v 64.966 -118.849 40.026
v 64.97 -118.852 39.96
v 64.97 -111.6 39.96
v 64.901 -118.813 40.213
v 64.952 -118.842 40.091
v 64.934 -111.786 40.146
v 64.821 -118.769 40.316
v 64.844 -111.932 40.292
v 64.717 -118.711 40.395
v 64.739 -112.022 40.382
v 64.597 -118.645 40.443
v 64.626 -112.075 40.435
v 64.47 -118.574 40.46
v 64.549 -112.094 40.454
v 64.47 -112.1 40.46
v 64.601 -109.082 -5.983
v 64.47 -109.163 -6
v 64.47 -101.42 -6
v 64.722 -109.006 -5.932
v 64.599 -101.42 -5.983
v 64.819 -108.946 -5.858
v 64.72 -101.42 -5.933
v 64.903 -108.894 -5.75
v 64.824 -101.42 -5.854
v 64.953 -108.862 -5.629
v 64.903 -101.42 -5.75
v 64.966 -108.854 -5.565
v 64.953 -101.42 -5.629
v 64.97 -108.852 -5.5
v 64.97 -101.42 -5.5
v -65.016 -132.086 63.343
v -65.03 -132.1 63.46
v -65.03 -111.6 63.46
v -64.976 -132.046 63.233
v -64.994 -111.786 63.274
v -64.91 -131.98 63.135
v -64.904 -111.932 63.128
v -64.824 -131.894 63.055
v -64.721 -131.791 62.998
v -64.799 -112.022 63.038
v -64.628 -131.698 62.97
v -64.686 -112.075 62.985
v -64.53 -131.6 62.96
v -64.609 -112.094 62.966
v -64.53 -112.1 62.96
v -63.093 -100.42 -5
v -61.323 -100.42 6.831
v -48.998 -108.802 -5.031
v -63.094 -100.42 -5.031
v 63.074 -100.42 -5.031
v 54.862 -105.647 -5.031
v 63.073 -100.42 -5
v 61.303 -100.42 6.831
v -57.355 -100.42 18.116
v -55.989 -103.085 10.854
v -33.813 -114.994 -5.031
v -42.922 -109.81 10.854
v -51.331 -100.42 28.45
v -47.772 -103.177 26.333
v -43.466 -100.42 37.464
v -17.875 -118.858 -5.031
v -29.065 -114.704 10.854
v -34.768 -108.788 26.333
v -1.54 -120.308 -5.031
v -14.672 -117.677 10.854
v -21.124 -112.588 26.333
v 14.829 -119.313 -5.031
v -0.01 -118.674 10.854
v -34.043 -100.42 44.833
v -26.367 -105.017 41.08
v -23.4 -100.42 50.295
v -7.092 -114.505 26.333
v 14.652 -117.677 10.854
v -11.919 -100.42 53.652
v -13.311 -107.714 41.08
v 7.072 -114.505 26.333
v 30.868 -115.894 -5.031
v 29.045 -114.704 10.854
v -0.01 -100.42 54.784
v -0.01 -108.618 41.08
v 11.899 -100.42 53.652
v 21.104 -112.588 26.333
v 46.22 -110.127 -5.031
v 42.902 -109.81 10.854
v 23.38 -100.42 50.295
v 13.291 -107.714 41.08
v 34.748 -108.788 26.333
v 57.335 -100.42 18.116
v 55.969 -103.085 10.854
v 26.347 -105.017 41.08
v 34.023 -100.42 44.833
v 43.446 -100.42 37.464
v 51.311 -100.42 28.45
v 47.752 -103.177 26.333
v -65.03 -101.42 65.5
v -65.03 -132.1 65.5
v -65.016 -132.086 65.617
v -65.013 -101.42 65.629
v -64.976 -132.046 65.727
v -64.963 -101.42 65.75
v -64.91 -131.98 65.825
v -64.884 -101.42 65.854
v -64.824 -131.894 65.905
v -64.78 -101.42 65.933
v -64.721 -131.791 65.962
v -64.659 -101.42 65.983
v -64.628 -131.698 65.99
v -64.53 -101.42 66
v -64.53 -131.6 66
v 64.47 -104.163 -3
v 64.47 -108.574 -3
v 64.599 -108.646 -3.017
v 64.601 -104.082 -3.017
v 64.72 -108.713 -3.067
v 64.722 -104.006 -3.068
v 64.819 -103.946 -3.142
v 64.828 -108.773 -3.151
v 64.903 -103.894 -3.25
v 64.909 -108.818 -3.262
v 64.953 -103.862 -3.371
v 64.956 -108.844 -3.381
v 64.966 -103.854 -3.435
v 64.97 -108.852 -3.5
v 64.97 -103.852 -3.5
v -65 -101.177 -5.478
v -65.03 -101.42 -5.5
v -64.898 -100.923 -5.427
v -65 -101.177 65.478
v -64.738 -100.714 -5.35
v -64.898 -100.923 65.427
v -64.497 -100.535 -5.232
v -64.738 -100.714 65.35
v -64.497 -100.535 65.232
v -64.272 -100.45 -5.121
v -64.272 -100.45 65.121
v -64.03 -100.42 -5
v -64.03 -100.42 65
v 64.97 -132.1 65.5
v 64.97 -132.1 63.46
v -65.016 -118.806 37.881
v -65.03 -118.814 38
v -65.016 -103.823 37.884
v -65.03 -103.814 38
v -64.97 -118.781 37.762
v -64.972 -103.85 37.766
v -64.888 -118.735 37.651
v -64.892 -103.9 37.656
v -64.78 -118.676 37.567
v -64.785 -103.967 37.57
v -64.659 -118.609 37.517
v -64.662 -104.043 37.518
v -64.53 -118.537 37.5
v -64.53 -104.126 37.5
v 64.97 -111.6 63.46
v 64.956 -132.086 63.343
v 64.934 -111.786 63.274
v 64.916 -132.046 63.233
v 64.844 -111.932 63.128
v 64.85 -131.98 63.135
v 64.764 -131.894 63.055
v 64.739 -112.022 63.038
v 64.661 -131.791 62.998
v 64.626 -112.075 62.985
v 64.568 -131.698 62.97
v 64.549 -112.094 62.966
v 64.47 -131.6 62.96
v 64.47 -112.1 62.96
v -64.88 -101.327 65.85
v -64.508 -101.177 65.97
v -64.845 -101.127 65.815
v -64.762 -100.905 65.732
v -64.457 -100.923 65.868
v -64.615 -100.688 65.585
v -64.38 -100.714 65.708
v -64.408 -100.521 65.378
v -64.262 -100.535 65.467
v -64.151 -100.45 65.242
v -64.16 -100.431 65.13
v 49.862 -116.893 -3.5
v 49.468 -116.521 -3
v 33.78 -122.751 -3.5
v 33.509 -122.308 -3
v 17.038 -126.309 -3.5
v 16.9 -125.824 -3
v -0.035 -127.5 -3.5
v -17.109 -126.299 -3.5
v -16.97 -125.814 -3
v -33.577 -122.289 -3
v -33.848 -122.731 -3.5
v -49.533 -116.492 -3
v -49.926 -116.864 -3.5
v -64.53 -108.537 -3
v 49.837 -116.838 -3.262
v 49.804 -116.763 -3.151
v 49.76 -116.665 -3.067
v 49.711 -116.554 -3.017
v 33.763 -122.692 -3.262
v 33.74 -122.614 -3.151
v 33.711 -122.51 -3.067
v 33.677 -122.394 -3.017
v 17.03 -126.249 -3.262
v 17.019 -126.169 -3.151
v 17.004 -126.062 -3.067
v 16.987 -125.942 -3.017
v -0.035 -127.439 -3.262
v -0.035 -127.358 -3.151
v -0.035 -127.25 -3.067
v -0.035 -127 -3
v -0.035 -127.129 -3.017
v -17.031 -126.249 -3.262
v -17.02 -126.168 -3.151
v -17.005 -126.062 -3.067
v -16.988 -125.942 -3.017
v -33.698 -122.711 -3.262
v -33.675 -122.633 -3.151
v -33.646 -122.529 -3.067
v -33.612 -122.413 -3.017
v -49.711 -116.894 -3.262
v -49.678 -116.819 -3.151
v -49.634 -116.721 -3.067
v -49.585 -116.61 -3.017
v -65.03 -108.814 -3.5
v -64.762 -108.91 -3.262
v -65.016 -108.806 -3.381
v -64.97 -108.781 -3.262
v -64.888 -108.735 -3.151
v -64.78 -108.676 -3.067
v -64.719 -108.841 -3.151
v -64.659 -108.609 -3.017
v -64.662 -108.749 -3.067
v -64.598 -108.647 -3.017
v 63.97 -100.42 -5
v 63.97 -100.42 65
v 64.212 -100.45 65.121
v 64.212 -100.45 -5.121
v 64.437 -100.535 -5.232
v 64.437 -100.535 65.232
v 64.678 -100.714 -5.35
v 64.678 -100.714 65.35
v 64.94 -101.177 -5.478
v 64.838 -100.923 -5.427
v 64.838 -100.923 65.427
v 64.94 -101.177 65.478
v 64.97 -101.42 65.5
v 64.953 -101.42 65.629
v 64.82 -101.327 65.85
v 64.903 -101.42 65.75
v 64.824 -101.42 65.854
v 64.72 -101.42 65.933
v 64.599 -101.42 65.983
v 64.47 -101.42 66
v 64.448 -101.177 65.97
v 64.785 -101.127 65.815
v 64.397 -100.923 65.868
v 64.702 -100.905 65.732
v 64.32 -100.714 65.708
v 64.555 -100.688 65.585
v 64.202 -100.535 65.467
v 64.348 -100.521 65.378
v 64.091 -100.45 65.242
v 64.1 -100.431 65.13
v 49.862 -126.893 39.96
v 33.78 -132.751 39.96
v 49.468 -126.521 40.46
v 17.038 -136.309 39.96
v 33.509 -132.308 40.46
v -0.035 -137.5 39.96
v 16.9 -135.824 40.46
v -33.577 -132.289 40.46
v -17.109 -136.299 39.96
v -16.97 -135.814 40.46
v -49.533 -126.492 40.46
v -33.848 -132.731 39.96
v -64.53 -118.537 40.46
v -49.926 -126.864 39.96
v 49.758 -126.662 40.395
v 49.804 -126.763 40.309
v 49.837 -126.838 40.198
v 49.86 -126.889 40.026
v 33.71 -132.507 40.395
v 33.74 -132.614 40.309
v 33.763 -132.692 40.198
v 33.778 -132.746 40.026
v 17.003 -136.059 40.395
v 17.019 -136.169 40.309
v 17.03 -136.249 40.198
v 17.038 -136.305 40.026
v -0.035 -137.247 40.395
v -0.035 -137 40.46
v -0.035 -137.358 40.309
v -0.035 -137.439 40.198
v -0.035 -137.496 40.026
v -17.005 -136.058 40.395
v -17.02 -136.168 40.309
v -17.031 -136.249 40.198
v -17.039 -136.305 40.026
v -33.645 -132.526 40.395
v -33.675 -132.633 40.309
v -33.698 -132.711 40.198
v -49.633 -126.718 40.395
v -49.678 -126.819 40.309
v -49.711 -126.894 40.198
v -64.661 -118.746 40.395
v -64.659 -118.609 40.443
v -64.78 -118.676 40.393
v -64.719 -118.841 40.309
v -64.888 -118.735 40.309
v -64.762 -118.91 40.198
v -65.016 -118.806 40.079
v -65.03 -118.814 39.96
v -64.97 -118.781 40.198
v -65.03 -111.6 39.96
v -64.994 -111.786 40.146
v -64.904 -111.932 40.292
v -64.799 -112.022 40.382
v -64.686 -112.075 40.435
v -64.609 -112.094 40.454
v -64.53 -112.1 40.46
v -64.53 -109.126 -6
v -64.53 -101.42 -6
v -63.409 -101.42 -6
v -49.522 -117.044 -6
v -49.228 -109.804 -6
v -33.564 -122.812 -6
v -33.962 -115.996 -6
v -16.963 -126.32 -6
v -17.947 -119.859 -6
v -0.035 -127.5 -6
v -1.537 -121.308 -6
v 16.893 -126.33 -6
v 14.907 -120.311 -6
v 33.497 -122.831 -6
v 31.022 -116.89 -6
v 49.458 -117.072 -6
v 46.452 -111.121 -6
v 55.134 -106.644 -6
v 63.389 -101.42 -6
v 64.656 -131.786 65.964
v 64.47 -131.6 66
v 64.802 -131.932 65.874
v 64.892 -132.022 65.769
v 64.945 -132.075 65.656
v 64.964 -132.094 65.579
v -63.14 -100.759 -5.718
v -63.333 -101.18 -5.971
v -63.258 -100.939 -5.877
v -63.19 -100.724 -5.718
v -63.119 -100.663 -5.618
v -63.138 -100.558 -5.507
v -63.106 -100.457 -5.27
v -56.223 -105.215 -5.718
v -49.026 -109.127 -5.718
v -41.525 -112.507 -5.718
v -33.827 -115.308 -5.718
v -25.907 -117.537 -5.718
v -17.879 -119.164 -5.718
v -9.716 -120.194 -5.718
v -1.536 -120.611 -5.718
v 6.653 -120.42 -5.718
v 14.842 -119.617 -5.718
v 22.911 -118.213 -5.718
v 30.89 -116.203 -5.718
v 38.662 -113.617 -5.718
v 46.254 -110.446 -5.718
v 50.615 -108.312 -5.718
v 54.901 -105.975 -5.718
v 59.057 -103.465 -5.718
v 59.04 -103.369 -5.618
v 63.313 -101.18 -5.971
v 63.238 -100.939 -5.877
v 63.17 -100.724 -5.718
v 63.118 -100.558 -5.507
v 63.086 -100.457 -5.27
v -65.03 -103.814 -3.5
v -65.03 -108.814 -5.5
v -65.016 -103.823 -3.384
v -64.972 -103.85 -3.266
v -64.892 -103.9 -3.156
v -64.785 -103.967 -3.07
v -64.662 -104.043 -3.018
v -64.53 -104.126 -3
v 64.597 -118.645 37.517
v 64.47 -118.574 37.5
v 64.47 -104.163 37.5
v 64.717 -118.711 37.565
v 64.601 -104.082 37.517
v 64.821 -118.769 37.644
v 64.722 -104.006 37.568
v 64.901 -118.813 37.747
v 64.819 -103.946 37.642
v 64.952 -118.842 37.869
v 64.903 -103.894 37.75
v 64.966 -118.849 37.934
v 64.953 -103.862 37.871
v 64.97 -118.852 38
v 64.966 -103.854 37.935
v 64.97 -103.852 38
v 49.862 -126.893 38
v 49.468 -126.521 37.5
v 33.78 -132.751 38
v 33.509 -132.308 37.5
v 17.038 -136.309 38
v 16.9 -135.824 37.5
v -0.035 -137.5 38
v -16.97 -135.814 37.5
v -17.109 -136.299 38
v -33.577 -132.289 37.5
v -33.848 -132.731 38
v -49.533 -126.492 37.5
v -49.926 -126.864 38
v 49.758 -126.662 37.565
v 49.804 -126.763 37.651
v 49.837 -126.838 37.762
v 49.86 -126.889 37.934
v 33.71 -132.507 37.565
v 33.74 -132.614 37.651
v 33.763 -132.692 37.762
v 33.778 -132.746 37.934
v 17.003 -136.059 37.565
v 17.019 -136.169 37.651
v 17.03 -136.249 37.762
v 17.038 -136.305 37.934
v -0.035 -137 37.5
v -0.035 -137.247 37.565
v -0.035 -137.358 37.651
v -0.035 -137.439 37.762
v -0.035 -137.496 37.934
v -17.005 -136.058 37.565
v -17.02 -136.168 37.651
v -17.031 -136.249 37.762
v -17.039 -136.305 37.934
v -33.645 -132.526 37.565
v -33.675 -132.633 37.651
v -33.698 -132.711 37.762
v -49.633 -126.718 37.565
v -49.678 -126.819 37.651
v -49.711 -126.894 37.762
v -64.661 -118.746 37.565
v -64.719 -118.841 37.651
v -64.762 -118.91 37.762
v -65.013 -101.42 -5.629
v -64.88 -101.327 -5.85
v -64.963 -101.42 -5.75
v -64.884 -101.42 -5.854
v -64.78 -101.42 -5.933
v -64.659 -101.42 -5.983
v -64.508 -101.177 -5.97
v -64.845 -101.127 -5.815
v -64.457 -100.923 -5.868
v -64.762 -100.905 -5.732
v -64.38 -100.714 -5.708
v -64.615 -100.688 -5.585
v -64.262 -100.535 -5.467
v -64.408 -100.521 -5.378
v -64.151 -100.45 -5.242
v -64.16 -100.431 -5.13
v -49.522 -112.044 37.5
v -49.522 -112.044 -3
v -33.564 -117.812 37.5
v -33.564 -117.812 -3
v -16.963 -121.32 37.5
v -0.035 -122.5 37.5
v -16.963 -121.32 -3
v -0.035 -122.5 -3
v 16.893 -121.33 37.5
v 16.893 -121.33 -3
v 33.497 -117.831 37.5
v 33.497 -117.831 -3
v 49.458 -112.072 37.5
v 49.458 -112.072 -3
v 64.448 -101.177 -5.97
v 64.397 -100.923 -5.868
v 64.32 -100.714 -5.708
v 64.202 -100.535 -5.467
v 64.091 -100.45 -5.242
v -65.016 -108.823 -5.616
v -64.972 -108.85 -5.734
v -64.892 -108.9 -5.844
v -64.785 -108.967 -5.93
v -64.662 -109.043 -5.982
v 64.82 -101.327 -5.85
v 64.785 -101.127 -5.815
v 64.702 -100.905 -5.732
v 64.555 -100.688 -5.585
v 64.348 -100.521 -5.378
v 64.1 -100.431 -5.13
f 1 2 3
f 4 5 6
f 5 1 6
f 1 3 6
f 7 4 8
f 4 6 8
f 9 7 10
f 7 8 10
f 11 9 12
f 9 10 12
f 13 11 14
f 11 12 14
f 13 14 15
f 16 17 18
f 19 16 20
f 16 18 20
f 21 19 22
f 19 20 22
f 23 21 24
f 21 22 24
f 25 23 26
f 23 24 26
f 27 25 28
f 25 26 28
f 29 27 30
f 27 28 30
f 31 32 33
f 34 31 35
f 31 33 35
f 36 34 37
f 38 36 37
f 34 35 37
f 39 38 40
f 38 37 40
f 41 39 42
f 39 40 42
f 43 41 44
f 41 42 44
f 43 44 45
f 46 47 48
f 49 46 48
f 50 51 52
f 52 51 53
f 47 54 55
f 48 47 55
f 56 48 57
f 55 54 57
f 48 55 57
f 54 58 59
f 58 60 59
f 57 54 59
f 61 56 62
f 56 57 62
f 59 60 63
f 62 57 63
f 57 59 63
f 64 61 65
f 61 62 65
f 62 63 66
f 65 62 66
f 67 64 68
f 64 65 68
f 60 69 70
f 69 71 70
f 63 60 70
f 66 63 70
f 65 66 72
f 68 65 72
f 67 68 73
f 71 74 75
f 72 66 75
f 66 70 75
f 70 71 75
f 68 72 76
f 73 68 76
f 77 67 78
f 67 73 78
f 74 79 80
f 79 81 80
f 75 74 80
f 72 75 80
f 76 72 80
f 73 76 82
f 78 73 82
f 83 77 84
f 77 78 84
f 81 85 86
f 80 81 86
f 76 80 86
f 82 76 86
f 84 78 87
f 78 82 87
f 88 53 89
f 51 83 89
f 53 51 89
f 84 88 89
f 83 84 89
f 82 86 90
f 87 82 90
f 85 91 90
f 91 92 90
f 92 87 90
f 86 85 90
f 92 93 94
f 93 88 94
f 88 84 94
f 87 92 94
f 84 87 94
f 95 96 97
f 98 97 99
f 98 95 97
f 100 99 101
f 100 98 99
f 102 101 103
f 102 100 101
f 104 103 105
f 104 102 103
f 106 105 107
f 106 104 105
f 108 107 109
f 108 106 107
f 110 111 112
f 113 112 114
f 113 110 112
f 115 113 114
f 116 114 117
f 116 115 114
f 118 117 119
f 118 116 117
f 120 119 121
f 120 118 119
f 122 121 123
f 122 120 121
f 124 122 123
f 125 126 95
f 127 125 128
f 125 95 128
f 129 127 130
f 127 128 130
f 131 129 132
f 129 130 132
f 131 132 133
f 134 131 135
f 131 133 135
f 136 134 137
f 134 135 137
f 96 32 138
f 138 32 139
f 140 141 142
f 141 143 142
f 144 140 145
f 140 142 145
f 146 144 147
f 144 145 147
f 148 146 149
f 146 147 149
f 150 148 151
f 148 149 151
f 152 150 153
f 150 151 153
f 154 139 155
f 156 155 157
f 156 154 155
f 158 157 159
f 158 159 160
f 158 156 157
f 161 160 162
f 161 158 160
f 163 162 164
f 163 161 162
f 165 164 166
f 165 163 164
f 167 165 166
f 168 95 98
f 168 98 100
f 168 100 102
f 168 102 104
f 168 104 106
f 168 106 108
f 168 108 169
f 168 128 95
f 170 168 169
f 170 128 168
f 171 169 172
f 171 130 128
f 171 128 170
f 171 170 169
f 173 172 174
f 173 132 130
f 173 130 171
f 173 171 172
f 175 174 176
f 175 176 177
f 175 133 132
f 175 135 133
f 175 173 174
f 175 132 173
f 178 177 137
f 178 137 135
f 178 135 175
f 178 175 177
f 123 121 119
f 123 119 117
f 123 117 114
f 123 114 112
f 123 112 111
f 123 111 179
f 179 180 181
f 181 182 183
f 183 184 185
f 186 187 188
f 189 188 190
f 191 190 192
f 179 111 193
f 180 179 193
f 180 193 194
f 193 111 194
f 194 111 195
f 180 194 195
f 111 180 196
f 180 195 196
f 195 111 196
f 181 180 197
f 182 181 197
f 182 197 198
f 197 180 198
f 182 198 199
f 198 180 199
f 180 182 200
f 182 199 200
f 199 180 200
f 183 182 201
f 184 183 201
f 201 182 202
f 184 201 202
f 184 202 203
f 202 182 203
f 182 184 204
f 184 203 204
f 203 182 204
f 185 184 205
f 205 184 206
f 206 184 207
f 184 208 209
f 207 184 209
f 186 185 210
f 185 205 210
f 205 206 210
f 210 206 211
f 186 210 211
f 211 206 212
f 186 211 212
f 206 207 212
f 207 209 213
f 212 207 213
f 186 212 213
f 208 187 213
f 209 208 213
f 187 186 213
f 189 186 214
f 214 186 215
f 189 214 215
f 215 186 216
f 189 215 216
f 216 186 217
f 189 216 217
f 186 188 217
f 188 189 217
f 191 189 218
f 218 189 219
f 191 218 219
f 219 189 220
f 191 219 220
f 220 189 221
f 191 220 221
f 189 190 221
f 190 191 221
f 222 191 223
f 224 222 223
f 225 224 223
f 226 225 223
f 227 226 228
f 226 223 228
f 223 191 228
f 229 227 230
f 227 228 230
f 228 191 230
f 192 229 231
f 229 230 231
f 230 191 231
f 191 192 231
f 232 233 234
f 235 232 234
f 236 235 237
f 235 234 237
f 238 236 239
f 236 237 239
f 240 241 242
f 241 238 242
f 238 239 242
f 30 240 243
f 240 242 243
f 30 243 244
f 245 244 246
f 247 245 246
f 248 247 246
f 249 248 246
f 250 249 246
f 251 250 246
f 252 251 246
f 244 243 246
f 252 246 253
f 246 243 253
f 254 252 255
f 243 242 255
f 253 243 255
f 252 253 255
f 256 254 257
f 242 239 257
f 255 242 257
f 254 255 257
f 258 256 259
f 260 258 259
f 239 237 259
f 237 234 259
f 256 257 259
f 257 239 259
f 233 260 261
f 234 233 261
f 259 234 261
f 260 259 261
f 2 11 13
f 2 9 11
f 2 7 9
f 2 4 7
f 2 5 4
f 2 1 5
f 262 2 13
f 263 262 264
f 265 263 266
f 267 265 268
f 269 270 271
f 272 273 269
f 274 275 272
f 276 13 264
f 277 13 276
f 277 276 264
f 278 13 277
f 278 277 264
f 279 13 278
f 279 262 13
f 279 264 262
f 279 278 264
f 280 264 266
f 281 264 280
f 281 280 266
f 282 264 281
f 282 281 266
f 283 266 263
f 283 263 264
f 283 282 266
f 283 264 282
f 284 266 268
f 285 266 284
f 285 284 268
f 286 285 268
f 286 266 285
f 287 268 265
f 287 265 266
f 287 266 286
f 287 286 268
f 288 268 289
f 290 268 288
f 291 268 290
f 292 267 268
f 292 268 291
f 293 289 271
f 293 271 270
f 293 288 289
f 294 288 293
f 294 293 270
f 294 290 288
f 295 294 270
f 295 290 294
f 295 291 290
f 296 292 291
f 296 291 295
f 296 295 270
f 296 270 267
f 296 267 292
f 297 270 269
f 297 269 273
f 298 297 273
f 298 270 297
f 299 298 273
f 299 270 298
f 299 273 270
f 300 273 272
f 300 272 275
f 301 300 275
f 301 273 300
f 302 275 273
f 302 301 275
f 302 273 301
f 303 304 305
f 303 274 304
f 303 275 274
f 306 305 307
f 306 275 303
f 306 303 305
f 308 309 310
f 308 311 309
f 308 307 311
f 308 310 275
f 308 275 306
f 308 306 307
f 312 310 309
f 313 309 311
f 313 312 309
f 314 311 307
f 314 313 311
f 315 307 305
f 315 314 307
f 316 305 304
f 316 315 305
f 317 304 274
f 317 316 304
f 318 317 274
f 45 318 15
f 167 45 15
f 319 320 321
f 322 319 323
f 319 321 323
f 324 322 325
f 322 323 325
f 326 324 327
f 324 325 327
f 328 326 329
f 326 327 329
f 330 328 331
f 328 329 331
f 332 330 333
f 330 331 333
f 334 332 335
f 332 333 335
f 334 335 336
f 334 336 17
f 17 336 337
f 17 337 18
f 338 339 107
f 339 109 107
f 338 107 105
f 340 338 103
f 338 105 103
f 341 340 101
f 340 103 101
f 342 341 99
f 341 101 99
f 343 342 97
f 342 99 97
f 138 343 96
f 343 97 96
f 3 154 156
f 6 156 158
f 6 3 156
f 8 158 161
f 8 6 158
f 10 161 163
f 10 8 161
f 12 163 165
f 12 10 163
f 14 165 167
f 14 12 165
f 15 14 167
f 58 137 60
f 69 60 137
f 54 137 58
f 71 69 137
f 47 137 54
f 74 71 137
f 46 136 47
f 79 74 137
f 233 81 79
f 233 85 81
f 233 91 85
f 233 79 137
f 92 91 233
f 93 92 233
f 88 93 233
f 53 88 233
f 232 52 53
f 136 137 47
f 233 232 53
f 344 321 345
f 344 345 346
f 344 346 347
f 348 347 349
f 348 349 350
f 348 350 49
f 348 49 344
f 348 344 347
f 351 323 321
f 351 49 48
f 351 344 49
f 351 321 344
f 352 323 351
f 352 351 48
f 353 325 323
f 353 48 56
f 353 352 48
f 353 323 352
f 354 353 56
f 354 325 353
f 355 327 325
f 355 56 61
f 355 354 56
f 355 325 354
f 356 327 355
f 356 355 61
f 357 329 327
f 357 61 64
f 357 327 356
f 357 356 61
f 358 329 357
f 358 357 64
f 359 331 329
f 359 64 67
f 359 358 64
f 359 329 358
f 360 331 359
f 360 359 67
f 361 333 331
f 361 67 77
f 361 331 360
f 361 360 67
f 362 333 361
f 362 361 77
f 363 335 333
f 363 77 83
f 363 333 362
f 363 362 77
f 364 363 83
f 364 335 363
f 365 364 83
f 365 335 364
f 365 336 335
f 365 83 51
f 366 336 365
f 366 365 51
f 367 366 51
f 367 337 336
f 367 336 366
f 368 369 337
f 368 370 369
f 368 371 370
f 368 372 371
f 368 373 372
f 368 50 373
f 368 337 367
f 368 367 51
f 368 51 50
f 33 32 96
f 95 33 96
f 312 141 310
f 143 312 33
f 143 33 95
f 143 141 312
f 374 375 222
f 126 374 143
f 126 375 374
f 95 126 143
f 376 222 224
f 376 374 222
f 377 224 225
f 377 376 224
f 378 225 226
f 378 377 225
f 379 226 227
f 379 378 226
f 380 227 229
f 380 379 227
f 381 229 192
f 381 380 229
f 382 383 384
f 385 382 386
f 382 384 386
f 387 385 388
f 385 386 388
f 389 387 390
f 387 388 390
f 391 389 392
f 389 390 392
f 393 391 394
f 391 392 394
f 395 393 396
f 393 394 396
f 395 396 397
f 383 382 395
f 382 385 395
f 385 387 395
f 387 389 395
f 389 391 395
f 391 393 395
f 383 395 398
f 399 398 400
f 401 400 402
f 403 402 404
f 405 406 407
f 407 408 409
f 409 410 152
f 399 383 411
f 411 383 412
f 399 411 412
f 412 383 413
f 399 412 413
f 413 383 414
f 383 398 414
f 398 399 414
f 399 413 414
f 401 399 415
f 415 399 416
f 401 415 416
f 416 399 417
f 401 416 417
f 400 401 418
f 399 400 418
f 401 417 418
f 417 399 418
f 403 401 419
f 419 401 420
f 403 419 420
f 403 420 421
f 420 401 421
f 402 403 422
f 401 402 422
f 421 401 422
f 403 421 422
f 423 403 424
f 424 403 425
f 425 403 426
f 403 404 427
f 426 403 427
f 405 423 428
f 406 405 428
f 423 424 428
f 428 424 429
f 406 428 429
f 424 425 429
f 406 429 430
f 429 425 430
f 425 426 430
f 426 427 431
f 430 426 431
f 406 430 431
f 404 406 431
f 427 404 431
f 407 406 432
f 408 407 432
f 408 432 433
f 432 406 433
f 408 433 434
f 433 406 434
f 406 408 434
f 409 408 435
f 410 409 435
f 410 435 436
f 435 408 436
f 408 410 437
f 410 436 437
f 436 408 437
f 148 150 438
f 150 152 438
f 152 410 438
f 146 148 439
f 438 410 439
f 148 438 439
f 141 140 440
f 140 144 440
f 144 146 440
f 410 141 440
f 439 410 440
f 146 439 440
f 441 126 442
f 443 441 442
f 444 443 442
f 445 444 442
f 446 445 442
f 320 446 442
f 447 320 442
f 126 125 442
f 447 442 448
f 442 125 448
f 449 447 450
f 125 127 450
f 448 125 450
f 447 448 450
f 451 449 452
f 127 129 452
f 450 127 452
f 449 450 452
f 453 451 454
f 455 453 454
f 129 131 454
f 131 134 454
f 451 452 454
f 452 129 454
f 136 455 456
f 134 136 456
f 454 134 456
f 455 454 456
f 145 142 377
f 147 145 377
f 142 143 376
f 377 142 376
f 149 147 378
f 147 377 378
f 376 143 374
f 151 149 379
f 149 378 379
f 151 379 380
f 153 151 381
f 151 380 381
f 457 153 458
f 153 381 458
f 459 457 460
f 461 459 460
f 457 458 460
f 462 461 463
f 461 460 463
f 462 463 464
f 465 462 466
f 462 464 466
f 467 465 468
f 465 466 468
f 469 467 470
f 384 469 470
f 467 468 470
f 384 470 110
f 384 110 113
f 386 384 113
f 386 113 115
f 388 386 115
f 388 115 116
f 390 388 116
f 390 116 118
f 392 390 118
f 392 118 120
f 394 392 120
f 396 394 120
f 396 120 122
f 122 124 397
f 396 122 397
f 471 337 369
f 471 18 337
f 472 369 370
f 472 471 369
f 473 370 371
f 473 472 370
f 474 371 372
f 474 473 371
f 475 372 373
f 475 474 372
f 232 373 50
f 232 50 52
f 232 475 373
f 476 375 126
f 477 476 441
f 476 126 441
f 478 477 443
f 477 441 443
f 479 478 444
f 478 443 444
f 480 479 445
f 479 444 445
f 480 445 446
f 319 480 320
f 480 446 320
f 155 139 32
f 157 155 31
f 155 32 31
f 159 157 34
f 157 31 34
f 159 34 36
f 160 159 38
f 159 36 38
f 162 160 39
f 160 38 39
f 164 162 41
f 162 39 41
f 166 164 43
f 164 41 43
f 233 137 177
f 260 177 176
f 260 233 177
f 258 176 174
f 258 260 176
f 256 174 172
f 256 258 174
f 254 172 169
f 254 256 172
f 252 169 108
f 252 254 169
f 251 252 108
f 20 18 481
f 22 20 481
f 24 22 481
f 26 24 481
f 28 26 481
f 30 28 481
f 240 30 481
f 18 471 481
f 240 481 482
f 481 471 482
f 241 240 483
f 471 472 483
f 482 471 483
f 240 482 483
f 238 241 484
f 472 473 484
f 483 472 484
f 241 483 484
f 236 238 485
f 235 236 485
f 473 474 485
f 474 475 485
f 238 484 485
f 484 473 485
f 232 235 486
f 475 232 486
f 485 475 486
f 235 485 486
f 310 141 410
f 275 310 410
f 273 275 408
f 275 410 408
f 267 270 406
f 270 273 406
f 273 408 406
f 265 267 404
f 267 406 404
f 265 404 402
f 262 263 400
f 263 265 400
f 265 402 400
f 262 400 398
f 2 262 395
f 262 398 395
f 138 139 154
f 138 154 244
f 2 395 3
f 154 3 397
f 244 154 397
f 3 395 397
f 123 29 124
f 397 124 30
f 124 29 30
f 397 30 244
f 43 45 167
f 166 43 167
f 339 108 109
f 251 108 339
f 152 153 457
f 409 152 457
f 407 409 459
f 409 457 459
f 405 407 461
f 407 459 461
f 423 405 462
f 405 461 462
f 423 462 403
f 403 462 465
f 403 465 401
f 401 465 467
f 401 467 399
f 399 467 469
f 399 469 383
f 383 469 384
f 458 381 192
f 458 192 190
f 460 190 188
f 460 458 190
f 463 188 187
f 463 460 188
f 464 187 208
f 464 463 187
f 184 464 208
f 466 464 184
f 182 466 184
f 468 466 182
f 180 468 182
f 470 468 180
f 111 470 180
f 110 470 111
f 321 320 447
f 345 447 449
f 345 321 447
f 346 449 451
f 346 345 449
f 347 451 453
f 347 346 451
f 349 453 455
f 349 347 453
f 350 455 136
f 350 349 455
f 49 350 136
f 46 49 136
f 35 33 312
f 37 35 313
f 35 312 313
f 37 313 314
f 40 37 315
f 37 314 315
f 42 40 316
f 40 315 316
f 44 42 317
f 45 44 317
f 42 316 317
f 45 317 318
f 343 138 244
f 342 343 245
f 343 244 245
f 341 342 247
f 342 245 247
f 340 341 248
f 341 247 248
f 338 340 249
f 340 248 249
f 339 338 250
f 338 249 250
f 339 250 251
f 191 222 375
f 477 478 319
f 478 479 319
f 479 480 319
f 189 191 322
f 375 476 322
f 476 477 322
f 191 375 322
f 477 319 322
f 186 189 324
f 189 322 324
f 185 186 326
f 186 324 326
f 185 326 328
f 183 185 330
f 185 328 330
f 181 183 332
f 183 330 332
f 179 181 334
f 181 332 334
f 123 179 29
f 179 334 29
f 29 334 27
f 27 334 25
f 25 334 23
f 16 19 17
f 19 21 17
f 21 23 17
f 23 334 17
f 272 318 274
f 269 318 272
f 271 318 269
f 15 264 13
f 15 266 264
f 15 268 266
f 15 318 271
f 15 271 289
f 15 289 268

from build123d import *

# Parameters (mm, degrees)
BOX003_W      = 570
BOX003_H      = 100
BOX003_DEPTH  = 22.5
TUBE003_R     = 250
TUBE003_R_2   = 122.5
TUBE003_DEPTH = 37.5
TUBE002_R     = 250
TUBE002_R_2   = 122.5
TUBE002_DEPTH = 37.5
TUBE001_R     = 250
TUBE001_R_2   = 122.5
TUBE001_DEPTH = 40.5
BOX001_W      = 570
BOX001_H      = 100
BOX001_DEPTH  = 22.5
BOX_W         = 130
BOX_H         = 70
BOX_DEPTH     = 72
FILLET_R      = 1
FILLET001_R   = 0.5
FILLET002_R   = 0.5
FILLET003_R   = 0.5


with BuildPart() as sphere:
    # Sphere → Sphere (revolve)
    with BuildSketch(Plane(origin=(-0.01, -10.37, -8.39), x_dir=(1, 0, 0), z_dir=(0, -1, 0))):
        with BuildLine():
            ThreePointArc((0, -110), (110, 0), (0, 110))
            Line((0, 110), (0, -110))
        make_face()
    revolve(axis=Axis((-0.01, -10.37, -8.39), (0, 0, 1)))


with BuildPart() as box003:
    # Box003 → Box003 (new body)
    with BuildSketch(Plane(origin=(-285.31, -232.1, 44.4), x_dir=(1, 0, 0), z_dir=(0, 0, 1))):
        with Locations((285, 50)):
            Rectangle(BOX003_W, BOX003_H)
    extrude(amount=BOX003_DEPTH)


with BuildPart() as tube003:
    # Tube003 → Tube003 (new body)
    with BuildSketch(Plane(origin=(0, -15, 10), x_dir=(1, 0, 0), z_dir=(0, 0, 1))):
        Circle(TUBE003_R)
        Circle(TUBE003_R_2, mode=Mode.SUBTRACT)
    extrude(amount=TUBE003_DEPTH)


with BuildPart() as tube002:
    # Tube002 → Tube002 (new body)
    with BuildSketch(Plane(origin=(0, -5, -10), x_dir=(1, 0, 0), z_dir=(0, 0, 1))):
        Circle(TUBE002_R)
        Circle(TUBE002_R_2, mode=Mode.SUBTRACT)
    extrude(amount=TUBE002_DEPTH)


with BuildPart() as tube001:
    # Tube001 → Tube001 (new body)
    with BuildSketch(Plane.XY.offset(-3)):
        Circle(TUBE001_R)
        Circle(TUBE001_R_2, mode=Mode.SUBTRACT)
    extrude(amount=TUBE001_DEPTH)


with BuildPart() as box001:
    # Box001 → Box001 (new body)
    with BuildSketch(Plane(origin=(-285.31, -212.1, 40.46), x_dir=(1, 0, 0), z_dir=(0, 0, 1))):
        with Locations((285, 50)):
            Rectangle(BOX001_W, BOX001_H)
    extrude(amount=BOX001_DEPTH)


with BuildPart() as fillet003:
    # Box → Box (new body)
    with BuildSketch(Plane(origin=(-65.03, -170.42, -6), x_dir=(1, 0, 0), z_dir=(0, 0, 1))):
        with Locations((65, 35)):
            Rectangle(BOX_W, BOX_H)
    extrude(amount=BOX_DEPTH)

    # Cut: cut Box001
    add(box001.part, mode=Mode.SUBTRACT)

    # Cut001: cut Tube001
    add(tube001.part, mode=Mode.SUBTRACT)

    # Cut002: cut Tube002
    add(tube002.part, mode=Mode.SUBTRACT)

    # Cut003: cut Tube003
    add(tube003.part, mode=Mode.SUBTRACT)

    # Cut004: cut Box003
    add(box003.part, mode=Mode.SUBTRACT)

    # Cut005: cut Sphere
    add(sphere.part, mode=Mode.SUBTRACT)

    # Fillet
    fillet_edges = [fillet003.edges().sort_by_distance(p)[0] for p in [
        (-65.03, -100.42, 30),
        (-0.03, -100.42, 66),
        (-64.084558, -100.42, -6),
        (64.044558, -100.42, -6),
        (64.97, -100.42, 30),
        (-0.01, -120.344033, -6),
    ]]
    fillet(fillet_edges, radius=FILLET_R)

    # Fillet001
    fillet001_edges = [fillet003.edges().sort_by_distance(p)[0] for p in [
        (-65.03, -105.117006, -6),
        (64.97, -105.135786, -6),
    ]]
    fillet(fillet001_edges, radius=FILLET001_R)

    # Fillet002
    fillet002_edges = [fillet003.edges().sort_by_distance(p)[0] for p in [
        (-65.03, -111.314012, 37.5),
        (-65.03, -106.314012, -3),
        (-0.035393, -127.499995, -3),
        (64.97, -106.351572, -3),
        (64.97, -111.351572, 37.5),
        (-0.035393, -137.499995, 37.5),
    ]]
    fillet(fillet002_edges, radius=FILLET002_R)

    # Fillet003
    fillet003_edges = [fillet003.edges().sort_by_distance(p)[0] for p in [
        (-65.03, -116.76, 66),
        (-65.03, -122.1, 62.96),
        (-65.03, -112.1, 51.71),
        (-65.03, -115.457006, 40.46),
        (-0.03, -132.1, 66),
        (64.97, -116.76, 66),
        (-0.03, -132.1, 62.96),
        (64.97, -122.1, 62.96),
        (-0.035393, -137.499995, 40.46),
        (64.97, -112.1, 51.71),
        (64.97, -115.475786, 40.46),
    ]]
    fillet(fillet003_edges, radius=FILLET003_R)


solid = fillet003.part
